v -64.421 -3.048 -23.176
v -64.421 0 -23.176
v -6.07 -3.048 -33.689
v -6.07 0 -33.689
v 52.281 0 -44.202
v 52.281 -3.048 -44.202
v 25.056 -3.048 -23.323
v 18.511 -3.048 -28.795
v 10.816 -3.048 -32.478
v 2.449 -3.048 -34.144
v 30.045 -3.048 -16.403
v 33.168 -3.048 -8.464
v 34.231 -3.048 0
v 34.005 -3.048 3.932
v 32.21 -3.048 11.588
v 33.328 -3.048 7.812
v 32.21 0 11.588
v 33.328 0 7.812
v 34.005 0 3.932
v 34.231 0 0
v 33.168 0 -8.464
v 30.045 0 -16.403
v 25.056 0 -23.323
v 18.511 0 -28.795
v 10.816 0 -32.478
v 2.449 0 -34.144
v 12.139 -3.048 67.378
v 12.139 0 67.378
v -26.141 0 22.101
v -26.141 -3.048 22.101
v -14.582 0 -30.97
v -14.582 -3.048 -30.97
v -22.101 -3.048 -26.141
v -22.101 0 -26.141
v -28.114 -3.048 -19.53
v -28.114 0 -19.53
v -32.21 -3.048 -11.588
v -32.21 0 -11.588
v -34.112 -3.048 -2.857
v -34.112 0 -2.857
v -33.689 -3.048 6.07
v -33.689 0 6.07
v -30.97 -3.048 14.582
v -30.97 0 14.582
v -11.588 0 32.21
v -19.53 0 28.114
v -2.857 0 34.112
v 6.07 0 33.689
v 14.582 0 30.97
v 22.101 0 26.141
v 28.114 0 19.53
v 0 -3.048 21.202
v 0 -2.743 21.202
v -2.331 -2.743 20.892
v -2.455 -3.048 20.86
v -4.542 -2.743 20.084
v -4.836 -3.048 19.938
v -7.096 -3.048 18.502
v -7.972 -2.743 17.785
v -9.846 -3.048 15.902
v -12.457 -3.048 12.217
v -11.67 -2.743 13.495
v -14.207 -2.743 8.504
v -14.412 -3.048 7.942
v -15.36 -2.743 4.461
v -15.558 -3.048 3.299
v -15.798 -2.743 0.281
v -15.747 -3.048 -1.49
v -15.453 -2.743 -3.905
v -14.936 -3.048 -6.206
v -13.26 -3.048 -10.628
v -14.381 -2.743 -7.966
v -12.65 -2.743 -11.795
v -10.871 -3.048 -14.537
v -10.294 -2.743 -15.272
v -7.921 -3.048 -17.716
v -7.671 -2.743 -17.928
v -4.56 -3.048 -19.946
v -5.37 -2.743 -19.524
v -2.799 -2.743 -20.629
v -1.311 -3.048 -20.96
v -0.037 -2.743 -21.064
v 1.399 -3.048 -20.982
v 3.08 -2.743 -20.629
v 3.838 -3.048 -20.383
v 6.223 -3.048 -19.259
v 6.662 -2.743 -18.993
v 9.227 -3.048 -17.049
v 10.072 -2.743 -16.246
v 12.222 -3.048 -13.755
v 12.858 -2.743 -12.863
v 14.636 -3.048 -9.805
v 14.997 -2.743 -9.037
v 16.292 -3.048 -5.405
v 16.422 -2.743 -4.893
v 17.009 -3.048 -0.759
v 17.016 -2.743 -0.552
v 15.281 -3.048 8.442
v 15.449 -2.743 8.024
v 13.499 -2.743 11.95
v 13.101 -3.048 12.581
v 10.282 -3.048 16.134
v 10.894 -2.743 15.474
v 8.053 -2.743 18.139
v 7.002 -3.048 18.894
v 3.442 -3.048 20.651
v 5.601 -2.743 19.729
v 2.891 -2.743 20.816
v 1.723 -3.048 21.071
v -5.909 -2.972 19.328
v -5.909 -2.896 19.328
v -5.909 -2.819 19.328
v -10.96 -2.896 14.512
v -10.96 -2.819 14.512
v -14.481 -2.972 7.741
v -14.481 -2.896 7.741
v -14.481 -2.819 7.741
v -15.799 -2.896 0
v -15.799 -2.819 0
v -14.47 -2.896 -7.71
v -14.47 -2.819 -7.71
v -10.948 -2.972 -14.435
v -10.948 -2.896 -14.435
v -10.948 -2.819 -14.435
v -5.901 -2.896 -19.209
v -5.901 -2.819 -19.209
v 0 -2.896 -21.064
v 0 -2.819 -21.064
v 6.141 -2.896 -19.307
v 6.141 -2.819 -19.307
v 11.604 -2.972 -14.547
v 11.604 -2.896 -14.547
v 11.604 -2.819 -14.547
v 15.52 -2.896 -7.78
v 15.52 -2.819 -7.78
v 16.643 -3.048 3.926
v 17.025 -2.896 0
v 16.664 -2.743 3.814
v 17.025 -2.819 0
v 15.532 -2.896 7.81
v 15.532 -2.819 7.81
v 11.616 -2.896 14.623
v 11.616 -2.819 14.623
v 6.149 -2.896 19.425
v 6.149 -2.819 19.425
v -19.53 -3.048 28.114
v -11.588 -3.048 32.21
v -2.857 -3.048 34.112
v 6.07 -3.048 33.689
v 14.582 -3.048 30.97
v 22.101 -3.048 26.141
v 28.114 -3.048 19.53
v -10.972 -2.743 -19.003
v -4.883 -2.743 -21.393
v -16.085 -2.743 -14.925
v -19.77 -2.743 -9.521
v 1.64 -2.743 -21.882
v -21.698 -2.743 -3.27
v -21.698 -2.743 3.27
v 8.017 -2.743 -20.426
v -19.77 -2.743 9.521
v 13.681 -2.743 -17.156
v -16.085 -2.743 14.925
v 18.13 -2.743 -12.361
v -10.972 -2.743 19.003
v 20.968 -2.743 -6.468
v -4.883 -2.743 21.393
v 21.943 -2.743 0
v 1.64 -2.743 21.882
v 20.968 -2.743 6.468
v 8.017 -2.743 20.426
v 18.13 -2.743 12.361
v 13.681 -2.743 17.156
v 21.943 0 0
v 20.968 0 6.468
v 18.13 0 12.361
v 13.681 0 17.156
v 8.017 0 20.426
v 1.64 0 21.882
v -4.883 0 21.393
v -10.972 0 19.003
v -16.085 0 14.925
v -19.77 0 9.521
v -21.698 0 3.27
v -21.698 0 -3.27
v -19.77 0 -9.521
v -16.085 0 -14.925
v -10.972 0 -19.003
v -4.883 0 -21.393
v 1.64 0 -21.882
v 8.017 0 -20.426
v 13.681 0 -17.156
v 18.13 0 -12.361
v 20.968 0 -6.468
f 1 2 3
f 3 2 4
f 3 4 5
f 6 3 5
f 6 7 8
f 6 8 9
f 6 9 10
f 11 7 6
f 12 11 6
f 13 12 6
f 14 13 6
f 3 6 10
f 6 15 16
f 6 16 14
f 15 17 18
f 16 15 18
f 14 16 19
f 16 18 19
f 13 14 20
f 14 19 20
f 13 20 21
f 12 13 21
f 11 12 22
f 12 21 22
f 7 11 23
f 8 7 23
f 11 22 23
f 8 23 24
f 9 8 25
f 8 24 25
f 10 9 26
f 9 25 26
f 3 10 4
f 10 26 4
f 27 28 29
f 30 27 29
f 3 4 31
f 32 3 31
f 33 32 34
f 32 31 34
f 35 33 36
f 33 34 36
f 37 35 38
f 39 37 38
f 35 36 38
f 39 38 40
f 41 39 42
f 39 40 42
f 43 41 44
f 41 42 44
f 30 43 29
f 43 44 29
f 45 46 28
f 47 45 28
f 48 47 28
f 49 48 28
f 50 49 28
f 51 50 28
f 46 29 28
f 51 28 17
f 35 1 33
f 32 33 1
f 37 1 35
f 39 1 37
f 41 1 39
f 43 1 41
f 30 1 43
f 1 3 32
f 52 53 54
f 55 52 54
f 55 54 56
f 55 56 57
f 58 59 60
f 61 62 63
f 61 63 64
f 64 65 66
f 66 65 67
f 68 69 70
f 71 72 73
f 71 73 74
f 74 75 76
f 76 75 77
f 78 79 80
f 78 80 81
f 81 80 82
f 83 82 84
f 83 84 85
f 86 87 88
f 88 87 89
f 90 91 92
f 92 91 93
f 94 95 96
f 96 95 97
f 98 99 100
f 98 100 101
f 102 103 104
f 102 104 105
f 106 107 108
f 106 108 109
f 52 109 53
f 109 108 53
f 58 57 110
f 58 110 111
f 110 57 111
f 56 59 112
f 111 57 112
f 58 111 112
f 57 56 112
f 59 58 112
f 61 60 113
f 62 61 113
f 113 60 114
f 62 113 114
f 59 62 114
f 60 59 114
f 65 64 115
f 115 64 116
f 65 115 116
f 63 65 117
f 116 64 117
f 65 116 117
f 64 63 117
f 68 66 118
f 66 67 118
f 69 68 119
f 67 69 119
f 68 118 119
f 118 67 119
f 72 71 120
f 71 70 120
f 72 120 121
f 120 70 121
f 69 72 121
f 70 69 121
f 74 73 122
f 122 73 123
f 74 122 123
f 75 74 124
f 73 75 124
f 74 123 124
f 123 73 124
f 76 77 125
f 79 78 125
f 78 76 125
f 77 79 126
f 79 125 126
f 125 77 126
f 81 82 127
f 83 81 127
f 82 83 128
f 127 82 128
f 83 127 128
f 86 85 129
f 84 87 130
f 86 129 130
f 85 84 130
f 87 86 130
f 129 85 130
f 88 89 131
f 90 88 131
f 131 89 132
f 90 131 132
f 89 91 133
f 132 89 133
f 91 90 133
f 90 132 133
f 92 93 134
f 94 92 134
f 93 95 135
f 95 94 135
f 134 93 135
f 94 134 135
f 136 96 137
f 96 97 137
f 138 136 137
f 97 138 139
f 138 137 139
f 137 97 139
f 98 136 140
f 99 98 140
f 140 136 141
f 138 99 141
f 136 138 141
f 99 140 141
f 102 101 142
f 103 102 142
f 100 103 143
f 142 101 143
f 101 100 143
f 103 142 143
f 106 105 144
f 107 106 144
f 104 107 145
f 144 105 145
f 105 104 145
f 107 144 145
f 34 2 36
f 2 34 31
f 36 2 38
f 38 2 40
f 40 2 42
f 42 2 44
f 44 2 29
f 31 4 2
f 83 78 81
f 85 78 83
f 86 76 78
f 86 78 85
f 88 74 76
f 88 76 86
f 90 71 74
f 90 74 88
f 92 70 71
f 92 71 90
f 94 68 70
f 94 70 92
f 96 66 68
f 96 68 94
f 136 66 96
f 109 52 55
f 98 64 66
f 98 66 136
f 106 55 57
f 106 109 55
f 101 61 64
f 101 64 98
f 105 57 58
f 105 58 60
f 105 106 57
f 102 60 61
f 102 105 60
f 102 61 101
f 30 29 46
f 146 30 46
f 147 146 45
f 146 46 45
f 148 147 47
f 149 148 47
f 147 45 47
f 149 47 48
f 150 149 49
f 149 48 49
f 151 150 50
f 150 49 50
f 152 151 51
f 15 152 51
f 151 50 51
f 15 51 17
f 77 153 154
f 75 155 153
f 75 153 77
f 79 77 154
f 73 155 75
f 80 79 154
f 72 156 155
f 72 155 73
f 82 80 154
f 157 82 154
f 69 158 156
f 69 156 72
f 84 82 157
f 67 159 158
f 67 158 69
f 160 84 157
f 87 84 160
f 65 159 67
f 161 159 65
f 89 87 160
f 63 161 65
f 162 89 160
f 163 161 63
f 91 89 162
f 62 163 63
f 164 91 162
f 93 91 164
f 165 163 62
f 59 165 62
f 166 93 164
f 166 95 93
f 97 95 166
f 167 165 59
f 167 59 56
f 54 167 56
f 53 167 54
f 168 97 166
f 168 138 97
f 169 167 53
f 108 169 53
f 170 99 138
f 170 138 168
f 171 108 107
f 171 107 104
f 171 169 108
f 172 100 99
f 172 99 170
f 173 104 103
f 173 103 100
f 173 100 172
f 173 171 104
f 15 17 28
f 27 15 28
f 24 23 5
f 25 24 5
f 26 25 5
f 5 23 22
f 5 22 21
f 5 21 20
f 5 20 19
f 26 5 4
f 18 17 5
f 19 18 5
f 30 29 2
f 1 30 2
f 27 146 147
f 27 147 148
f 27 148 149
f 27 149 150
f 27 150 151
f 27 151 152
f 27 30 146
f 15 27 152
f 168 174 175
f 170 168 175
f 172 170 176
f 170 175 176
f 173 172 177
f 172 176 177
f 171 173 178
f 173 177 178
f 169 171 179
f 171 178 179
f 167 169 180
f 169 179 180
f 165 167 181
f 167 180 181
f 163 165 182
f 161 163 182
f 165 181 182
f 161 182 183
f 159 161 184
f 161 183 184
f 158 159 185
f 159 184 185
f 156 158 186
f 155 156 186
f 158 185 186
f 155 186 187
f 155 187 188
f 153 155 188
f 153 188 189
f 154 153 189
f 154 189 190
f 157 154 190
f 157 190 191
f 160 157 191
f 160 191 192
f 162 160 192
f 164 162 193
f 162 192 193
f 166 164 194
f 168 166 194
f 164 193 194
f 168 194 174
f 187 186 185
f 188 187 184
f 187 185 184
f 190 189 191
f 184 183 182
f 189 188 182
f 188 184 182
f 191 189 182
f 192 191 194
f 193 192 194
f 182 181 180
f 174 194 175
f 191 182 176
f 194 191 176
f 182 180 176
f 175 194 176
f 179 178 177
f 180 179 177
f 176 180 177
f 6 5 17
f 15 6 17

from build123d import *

# Parameters (mm, degrees)
F1_DEPTH = 3.048
F3_DEPTH = 3.048
F4_R     = 21.9430987276
F5_DEPTH = 2.7432


with BuildPart() as f1:
    # F0 (on Front) → F1 (new body)
    with BuildSketch(Plane.XZ):
        with BuildLine():
            Line((-26.1407493737, 22.100905052), (-64.4206397323, -23.1762012467))
            Line((-64.4206397323, -23.1762012467), (-6.0695717062, -33.6890053466))
            ThreePointArc((-6.0695717062, -33.6890053466), (-32.21032011, -11.5880999456), (-26.1407493737, 22.100905052))
        make_face()
    extrude(amount=F1_DEPTH)


with BuildPart() as f1b:
    # F0 (on Front) → F1, piece 2 (new body)
    with BuildSketch(Plane.XZ):
        with BuildLine():
            Line((12.1391408233, 67.3780111596), (-26.1407493737, 22.100905052))
            ThreePointArc((-26.1407493737, 22.100905052), (6.0695702668, 33.6890056059), (32.2103197241, 11.5881010182))
            Line((32.2103197241, 11.5881010182), (12.1391408233, 67.3780111596))
        make_face()
    extrude(amount=F1_DEPTH)


with BuildPart() as f1c:
    # F0 (on Front) → F1, piece 3 (new body)
    with BuildSketch(Plane.XZ):
        with BuildLine():
            ThreePointArc((34.2314005255, 0), (21.9547129547, -26.263650946), (-6.0695717062, -33.6890053466))
            Line((-6.0695717062, -33.6890053466), (52.281498909, -44.2018099129))
            Line((52.281498909, -44.2018099129), (32.2103197241, 11.5881010182))
            ThreePointArc((32.2103197241, 11.5881010182), (33.7223452437, 5.8815145331), (34.2314005255, 0))
        make_face()
    extrude(amount=F1_DEPTH)


with BuildPart() as f3:
    # F2 (on Front) → F3 (new body)
    with BuildSketch(Plane.XZ):
        with BuildLine():
            add(Edge.make_bspline(
                [(0, 21.2016310543), (-8.1505647477, 21.1034222535), (-23.4533414123, -0.024826285), (-0.3813172863, -31.5743947125), (25.7890839147, -0.0267917458), (8.2653531276, 21.3012229775), (0, 21.2016310543)],
                knots=[0, 0, 0, 0, 0.248503339, 0.49648954, 0.7479968672, 1, 1, 1, 1], degree=3))
        make_face()
    extrude(amount=F3_DEPTH)

    # F4 (on Front) → F5 (join)
    with BuildSketch(Plane.XZ):
        Circle(F4_R)
        with BuildLine():
            add(Edge.make_bspline(
                [(0, 11.7592252791), (4.1431981523, 11.6633875484), (11.3152742485, -0.1693753826), (0.381447044, -15.9165833063), (-13.657713804, -0.1974069716), (-4.2461372519, 11.8574441292), (0, 11.7592252791)],
                knots=[0, 0, 0, 0, 0.2506101519, 0.4934826116, 0.7431633578, 1, 1, 1, 1], degree=3))
        make_face(mode=Mode.SUBTRACT)
    extrude(amount=F5_DEPTH)


solid = Compound([f1.part, f1b.part, f1c.part, f3.part])
